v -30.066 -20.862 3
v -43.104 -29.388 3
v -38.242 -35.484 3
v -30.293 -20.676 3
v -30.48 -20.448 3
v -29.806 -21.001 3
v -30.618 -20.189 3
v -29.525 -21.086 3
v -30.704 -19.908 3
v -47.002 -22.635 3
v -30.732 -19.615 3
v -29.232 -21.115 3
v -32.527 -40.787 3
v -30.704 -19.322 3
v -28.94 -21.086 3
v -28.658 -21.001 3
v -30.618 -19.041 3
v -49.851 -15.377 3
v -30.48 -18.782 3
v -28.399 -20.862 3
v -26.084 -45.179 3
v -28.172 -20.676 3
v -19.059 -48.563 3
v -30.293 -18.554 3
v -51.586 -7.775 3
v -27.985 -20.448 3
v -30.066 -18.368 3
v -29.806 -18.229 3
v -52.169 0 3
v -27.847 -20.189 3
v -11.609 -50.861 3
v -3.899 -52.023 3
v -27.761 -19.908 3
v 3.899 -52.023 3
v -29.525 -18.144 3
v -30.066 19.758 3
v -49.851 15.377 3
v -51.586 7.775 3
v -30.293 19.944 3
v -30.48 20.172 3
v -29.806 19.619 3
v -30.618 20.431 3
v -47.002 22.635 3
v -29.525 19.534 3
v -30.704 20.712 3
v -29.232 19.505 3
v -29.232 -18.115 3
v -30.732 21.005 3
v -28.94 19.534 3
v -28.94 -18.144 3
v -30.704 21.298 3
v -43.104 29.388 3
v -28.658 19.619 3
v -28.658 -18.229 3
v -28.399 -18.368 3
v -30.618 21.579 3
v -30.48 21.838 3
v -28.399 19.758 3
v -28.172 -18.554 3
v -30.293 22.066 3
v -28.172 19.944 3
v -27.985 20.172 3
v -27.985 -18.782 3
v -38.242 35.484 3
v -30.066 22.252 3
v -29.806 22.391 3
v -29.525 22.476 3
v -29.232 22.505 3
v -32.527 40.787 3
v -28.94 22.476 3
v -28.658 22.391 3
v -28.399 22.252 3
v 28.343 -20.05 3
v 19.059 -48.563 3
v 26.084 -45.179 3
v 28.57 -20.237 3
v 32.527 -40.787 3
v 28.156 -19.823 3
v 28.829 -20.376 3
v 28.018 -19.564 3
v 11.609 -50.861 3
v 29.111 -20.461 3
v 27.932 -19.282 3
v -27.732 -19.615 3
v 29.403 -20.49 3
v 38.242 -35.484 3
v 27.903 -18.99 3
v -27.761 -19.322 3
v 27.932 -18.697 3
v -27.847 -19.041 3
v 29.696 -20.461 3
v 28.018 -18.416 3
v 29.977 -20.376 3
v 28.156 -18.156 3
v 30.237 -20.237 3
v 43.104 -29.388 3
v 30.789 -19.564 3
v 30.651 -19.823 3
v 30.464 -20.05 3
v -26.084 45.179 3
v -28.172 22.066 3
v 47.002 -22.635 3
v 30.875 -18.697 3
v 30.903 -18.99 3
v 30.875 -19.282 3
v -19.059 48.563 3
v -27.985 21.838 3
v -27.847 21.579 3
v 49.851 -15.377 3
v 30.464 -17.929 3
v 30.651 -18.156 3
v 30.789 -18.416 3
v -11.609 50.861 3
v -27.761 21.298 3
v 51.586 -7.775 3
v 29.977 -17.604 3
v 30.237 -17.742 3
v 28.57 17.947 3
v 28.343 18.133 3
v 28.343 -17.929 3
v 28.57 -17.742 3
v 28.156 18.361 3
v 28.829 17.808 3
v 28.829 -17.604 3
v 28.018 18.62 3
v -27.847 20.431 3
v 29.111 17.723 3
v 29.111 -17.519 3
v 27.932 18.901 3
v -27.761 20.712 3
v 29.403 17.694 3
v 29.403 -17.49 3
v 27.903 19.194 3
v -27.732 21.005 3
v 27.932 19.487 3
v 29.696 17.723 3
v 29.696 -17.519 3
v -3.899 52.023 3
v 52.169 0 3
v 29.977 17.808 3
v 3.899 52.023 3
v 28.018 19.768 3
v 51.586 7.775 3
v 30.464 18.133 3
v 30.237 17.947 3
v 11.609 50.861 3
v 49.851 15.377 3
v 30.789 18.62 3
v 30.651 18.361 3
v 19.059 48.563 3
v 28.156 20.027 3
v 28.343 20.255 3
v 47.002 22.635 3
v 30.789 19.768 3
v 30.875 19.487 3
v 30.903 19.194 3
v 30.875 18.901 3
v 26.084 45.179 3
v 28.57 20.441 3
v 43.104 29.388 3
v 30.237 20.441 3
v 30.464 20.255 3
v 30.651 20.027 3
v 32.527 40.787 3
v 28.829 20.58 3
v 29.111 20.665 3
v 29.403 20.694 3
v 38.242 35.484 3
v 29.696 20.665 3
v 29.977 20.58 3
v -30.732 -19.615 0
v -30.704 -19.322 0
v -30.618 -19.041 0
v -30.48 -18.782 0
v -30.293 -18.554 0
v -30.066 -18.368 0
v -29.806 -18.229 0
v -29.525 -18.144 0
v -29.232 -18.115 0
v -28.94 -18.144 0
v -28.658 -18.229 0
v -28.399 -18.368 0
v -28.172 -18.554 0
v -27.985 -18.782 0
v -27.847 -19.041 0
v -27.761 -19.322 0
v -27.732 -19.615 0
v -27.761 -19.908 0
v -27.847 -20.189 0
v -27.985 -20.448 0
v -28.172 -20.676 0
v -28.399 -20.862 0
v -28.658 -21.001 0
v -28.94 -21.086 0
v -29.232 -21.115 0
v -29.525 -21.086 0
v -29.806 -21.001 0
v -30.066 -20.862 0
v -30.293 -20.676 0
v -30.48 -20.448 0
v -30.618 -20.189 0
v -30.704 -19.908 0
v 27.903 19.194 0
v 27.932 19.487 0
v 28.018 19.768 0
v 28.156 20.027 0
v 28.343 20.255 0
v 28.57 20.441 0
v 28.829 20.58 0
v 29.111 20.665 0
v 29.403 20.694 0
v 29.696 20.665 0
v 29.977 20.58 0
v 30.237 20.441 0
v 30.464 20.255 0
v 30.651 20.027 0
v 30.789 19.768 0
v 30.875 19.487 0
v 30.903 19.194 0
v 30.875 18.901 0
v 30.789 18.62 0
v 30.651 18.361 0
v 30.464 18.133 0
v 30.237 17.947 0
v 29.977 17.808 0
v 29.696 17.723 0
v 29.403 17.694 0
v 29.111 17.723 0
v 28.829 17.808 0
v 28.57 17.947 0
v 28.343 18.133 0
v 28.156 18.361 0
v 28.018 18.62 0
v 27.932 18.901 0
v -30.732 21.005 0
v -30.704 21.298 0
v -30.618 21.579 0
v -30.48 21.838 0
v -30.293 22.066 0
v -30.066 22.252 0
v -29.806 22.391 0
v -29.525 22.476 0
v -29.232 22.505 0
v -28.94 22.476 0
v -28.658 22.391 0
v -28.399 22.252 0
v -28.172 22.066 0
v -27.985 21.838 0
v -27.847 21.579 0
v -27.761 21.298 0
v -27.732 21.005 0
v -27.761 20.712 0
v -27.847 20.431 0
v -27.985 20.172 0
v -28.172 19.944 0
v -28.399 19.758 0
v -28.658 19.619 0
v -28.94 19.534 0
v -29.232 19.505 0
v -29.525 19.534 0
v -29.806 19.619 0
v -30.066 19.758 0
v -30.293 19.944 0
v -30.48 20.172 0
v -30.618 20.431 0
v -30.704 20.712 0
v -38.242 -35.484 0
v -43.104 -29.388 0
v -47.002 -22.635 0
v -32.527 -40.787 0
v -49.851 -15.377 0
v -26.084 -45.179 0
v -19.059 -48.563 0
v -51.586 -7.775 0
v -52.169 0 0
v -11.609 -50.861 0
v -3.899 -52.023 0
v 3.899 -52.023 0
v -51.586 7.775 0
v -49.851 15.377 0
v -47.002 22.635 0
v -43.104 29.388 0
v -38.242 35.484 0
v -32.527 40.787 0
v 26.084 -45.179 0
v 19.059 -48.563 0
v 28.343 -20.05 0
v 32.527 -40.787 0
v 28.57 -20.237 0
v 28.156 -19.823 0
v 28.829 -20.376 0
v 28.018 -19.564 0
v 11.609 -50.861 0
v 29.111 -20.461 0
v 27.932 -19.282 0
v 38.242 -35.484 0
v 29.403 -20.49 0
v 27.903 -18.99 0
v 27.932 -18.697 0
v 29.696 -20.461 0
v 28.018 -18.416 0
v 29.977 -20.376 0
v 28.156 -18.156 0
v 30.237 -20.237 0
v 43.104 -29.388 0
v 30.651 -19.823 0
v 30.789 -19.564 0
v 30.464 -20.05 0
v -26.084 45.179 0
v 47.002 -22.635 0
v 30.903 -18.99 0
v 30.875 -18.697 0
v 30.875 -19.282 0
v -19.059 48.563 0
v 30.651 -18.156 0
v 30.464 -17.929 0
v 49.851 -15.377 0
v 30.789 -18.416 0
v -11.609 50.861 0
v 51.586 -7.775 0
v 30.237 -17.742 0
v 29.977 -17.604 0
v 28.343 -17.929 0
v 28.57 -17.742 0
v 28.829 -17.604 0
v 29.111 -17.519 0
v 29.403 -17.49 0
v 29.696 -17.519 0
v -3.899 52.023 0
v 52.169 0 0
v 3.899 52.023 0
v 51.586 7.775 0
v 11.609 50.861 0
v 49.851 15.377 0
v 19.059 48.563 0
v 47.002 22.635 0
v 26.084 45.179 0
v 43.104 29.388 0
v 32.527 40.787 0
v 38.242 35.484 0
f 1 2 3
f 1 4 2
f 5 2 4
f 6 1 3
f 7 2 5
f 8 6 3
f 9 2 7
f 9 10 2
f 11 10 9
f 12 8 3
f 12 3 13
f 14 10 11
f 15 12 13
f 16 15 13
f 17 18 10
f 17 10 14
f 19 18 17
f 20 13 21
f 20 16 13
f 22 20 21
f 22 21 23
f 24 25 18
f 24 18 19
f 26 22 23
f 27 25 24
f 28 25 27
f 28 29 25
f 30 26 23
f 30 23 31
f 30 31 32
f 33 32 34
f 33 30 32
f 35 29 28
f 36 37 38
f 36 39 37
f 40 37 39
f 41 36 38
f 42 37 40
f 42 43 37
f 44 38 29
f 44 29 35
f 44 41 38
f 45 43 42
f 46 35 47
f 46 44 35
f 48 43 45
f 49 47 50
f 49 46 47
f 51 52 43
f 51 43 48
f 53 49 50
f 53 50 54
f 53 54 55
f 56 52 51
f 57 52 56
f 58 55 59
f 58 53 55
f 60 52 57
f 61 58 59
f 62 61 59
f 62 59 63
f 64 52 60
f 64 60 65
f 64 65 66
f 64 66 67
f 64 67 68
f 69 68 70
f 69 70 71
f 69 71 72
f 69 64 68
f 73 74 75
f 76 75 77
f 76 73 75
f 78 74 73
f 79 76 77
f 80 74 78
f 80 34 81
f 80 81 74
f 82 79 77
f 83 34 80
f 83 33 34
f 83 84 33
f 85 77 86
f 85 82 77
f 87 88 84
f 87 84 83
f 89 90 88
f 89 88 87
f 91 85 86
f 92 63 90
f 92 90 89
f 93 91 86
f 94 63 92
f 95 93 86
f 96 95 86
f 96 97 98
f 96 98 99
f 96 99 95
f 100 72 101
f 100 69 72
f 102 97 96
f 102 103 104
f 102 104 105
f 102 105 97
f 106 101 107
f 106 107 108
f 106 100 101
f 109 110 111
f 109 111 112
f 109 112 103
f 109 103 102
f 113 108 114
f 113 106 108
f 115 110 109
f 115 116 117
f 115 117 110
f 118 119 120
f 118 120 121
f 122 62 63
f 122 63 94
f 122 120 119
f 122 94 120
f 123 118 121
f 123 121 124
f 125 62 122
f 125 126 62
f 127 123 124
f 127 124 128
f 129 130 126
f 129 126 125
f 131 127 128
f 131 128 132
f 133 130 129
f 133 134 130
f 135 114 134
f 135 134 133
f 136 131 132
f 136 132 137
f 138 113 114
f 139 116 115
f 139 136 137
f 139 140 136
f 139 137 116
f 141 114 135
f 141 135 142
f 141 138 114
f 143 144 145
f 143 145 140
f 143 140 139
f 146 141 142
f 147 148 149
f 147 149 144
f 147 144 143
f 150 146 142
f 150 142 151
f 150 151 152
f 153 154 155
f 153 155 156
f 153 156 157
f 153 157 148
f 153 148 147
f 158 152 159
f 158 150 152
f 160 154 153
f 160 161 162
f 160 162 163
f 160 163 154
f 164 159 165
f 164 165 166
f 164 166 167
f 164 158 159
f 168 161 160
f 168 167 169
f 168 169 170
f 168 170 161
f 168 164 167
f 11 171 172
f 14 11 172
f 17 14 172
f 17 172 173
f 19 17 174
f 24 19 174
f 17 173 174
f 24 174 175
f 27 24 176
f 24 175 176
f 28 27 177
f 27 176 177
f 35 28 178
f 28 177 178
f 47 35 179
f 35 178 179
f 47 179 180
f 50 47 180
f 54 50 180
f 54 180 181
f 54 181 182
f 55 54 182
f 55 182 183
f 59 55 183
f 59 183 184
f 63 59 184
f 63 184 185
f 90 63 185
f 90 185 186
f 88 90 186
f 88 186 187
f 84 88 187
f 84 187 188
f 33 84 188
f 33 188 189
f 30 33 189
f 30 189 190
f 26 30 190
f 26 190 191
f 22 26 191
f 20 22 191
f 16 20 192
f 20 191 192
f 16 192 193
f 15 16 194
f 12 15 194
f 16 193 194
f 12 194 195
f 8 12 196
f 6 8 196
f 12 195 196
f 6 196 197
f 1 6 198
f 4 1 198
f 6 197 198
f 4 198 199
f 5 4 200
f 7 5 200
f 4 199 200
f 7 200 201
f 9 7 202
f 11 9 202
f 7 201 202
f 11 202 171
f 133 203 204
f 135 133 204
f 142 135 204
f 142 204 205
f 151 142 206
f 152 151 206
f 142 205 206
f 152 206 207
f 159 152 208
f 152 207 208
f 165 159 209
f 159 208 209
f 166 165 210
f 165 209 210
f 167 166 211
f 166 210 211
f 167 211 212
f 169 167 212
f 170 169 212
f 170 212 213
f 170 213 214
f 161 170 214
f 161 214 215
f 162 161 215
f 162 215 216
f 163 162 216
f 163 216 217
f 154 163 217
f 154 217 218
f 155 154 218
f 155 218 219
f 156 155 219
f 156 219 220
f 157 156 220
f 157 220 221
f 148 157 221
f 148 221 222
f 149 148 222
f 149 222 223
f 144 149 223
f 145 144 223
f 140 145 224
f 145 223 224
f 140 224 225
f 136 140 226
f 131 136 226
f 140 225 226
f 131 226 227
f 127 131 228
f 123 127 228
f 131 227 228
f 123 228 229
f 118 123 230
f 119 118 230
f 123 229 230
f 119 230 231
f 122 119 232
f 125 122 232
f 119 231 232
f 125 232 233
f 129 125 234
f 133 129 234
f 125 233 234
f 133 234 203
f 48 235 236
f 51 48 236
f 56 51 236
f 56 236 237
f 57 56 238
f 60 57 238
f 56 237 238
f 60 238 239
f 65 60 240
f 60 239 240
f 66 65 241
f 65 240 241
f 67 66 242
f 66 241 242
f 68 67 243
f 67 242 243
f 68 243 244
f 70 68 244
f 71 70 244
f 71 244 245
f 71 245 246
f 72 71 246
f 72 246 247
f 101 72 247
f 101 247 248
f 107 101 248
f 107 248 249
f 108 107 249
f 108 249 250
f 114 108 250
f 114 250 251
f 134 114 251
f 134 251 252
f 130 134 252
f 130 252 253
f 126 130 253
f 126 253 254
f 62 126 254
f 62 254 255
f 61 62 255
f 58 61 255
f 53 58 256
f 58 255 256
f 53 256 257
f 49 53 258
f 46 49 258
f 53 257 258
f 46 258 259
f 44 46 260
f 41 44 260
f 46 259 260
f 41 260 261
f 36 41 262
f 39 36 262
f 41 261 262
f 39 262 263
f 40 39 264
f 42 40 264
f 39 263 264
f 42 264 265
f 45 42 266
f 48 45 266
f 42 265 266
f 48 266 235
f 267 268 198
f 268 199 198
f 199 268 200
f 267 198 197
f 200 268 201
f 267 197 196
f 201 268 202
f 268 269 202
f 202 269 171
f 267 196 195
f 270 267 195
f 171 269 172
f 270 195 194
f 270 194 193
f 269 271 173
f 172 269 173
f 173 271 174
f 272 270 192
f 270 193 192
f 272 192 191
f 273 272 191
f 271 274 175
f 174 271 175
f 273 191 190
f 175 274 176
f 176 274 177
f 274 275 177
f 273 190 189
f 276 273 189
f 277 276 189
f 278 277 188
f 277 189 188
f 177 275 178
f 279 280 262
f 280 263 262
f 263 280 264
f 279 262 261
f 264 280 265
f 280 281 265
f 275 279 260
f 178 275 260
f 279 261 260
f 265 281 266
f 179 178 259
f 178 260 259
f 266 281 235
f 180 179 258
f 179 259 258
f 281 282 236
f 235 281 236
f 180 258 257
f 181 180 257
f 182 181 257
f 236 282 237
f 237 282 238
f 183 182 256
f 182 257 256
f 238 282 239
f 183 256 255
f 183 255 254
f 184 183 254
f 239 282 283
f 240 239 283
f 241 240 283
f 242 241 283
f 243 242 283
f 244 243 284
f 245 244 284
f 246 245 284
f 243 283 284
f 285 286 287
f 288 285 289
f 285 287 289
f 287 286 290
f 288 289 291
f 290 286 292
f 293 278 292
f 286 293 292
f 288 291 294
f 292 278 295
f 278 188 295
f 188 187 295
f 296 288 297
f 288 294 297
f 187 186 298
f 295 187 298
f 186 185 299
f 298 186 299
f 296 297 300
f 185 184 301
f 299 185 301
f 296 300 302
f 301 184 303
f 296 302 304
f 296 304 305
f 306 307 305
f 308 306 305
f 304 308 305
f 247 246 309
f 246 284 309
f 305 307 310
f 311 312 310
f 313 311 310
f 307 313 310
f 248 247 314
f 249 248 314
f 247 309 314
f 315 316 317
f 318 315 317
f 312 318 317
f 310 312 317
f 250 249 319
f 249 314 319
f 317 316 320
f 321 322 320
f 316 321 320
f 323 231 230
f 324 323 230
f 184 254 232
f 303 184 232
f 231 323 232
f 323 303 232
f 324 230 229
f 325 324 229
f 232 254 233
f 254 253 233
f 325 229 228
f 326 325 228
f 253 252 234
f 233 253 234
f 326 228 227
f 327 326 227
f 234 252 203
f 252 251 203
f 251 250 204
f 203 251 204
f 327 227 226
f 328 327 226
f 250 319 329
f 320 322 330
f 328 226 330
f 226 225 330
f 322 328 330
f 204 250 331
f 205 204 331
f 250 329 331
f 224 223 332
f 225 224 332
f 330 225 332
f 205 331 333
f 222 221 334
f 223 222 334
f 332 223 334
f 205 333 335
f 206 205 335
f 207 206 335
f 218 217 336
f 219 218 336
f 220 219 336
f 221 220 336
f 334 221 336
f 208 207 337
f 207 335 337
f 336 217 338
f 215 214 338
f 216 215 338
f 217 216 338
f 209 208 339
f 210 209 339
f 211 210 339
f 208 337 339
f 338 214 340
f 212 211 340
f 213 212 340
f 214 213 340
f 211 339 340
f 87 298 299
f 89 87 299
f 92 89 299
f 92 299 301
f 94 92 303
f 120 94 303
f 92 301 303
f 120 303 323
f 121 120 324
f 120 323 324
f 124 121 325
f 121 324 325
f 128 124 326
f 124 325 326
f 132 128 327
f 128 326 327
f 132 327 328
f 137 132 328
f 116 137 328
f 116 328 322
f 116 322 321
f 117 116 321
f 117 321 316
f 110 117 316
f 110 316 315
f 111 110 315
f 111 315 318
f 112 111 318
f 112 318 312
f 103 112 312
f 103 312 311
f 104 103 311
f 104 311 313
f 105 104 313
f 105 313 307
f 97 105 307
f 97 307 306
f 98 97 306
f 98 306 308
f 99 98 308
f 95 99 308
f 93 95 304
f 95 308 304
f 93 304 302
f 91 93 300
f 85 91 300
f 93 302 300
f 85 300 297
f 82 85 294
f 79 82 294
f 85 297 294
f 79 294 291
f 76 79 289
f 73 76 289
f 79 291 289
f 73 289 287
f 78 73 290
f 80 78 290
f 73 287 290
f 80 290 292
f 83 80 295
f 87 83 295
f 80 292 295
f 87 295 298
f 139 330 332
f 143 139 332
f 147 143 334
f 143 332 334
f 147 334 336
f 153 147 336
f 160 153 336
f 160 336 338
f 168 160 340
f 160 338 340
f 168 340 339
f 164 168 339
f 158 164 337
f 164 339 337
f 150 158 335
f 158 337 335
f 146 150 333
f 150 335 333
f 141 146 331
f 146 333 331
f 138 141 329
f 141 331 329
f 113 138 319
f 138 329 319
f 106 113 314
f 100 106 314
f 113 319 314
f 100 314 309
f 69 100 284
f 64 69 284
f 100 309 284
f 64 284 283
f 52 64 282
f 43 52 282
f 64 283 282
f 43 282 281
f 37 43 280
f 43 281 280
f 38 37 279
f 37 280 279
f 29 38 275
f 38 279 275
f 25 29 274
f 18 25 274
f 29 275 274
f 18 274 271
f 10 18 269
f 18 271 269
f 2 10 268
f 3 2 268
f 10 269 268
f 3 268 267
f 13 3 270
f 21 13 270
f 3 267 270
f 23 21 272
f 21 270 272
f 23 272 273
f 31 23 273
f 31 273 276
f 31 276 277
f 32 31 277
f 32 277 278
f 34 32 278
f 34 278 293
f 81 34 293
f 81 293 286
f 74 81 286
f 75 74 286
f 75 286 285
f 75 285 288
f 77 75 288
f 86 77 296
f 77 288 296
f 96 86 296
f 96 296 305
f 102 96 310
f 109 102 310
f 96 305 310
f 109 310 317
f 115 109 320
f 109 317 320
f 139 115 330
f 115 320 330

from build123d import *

# Parameters (mm, degrees)
F0_R     = 52.168743
F1_DEPTH = 3
F3_D     = 3
F7_D     = 3


with BuildPart() as f1:
    # F0 (on Top) → F1 (new body)
    with BuildSketch(Plane.XY):
        Circle(F0_R)
    extrude(amount=F1_DEPTH)

    # F3 (through all)
    with Locations(Plane(origin=(0, 0, 0), x_dir=(1, 0, 0), z_dir=(0, 0, -1))):
        with Locations((-14.456525, -16.74062), (9.536847, -16.74062)):
            Hole(F3_D / 2)

    # F4: F1 across plane


with BuildPart() as f1_1:
    add(f1.part)
    add(f1.part.mirror(Plane.XZ))

    # F7 (through all)
    with Locations(Plane.XY.offset(3)):
        with Locations((-29.232398, 21.0049), (-29.232398, -19.615047), (29.403359, 19.193865), (29.403359, -18.989682)):
            Hole(F7_D / 2)


solid = f1_1.part
